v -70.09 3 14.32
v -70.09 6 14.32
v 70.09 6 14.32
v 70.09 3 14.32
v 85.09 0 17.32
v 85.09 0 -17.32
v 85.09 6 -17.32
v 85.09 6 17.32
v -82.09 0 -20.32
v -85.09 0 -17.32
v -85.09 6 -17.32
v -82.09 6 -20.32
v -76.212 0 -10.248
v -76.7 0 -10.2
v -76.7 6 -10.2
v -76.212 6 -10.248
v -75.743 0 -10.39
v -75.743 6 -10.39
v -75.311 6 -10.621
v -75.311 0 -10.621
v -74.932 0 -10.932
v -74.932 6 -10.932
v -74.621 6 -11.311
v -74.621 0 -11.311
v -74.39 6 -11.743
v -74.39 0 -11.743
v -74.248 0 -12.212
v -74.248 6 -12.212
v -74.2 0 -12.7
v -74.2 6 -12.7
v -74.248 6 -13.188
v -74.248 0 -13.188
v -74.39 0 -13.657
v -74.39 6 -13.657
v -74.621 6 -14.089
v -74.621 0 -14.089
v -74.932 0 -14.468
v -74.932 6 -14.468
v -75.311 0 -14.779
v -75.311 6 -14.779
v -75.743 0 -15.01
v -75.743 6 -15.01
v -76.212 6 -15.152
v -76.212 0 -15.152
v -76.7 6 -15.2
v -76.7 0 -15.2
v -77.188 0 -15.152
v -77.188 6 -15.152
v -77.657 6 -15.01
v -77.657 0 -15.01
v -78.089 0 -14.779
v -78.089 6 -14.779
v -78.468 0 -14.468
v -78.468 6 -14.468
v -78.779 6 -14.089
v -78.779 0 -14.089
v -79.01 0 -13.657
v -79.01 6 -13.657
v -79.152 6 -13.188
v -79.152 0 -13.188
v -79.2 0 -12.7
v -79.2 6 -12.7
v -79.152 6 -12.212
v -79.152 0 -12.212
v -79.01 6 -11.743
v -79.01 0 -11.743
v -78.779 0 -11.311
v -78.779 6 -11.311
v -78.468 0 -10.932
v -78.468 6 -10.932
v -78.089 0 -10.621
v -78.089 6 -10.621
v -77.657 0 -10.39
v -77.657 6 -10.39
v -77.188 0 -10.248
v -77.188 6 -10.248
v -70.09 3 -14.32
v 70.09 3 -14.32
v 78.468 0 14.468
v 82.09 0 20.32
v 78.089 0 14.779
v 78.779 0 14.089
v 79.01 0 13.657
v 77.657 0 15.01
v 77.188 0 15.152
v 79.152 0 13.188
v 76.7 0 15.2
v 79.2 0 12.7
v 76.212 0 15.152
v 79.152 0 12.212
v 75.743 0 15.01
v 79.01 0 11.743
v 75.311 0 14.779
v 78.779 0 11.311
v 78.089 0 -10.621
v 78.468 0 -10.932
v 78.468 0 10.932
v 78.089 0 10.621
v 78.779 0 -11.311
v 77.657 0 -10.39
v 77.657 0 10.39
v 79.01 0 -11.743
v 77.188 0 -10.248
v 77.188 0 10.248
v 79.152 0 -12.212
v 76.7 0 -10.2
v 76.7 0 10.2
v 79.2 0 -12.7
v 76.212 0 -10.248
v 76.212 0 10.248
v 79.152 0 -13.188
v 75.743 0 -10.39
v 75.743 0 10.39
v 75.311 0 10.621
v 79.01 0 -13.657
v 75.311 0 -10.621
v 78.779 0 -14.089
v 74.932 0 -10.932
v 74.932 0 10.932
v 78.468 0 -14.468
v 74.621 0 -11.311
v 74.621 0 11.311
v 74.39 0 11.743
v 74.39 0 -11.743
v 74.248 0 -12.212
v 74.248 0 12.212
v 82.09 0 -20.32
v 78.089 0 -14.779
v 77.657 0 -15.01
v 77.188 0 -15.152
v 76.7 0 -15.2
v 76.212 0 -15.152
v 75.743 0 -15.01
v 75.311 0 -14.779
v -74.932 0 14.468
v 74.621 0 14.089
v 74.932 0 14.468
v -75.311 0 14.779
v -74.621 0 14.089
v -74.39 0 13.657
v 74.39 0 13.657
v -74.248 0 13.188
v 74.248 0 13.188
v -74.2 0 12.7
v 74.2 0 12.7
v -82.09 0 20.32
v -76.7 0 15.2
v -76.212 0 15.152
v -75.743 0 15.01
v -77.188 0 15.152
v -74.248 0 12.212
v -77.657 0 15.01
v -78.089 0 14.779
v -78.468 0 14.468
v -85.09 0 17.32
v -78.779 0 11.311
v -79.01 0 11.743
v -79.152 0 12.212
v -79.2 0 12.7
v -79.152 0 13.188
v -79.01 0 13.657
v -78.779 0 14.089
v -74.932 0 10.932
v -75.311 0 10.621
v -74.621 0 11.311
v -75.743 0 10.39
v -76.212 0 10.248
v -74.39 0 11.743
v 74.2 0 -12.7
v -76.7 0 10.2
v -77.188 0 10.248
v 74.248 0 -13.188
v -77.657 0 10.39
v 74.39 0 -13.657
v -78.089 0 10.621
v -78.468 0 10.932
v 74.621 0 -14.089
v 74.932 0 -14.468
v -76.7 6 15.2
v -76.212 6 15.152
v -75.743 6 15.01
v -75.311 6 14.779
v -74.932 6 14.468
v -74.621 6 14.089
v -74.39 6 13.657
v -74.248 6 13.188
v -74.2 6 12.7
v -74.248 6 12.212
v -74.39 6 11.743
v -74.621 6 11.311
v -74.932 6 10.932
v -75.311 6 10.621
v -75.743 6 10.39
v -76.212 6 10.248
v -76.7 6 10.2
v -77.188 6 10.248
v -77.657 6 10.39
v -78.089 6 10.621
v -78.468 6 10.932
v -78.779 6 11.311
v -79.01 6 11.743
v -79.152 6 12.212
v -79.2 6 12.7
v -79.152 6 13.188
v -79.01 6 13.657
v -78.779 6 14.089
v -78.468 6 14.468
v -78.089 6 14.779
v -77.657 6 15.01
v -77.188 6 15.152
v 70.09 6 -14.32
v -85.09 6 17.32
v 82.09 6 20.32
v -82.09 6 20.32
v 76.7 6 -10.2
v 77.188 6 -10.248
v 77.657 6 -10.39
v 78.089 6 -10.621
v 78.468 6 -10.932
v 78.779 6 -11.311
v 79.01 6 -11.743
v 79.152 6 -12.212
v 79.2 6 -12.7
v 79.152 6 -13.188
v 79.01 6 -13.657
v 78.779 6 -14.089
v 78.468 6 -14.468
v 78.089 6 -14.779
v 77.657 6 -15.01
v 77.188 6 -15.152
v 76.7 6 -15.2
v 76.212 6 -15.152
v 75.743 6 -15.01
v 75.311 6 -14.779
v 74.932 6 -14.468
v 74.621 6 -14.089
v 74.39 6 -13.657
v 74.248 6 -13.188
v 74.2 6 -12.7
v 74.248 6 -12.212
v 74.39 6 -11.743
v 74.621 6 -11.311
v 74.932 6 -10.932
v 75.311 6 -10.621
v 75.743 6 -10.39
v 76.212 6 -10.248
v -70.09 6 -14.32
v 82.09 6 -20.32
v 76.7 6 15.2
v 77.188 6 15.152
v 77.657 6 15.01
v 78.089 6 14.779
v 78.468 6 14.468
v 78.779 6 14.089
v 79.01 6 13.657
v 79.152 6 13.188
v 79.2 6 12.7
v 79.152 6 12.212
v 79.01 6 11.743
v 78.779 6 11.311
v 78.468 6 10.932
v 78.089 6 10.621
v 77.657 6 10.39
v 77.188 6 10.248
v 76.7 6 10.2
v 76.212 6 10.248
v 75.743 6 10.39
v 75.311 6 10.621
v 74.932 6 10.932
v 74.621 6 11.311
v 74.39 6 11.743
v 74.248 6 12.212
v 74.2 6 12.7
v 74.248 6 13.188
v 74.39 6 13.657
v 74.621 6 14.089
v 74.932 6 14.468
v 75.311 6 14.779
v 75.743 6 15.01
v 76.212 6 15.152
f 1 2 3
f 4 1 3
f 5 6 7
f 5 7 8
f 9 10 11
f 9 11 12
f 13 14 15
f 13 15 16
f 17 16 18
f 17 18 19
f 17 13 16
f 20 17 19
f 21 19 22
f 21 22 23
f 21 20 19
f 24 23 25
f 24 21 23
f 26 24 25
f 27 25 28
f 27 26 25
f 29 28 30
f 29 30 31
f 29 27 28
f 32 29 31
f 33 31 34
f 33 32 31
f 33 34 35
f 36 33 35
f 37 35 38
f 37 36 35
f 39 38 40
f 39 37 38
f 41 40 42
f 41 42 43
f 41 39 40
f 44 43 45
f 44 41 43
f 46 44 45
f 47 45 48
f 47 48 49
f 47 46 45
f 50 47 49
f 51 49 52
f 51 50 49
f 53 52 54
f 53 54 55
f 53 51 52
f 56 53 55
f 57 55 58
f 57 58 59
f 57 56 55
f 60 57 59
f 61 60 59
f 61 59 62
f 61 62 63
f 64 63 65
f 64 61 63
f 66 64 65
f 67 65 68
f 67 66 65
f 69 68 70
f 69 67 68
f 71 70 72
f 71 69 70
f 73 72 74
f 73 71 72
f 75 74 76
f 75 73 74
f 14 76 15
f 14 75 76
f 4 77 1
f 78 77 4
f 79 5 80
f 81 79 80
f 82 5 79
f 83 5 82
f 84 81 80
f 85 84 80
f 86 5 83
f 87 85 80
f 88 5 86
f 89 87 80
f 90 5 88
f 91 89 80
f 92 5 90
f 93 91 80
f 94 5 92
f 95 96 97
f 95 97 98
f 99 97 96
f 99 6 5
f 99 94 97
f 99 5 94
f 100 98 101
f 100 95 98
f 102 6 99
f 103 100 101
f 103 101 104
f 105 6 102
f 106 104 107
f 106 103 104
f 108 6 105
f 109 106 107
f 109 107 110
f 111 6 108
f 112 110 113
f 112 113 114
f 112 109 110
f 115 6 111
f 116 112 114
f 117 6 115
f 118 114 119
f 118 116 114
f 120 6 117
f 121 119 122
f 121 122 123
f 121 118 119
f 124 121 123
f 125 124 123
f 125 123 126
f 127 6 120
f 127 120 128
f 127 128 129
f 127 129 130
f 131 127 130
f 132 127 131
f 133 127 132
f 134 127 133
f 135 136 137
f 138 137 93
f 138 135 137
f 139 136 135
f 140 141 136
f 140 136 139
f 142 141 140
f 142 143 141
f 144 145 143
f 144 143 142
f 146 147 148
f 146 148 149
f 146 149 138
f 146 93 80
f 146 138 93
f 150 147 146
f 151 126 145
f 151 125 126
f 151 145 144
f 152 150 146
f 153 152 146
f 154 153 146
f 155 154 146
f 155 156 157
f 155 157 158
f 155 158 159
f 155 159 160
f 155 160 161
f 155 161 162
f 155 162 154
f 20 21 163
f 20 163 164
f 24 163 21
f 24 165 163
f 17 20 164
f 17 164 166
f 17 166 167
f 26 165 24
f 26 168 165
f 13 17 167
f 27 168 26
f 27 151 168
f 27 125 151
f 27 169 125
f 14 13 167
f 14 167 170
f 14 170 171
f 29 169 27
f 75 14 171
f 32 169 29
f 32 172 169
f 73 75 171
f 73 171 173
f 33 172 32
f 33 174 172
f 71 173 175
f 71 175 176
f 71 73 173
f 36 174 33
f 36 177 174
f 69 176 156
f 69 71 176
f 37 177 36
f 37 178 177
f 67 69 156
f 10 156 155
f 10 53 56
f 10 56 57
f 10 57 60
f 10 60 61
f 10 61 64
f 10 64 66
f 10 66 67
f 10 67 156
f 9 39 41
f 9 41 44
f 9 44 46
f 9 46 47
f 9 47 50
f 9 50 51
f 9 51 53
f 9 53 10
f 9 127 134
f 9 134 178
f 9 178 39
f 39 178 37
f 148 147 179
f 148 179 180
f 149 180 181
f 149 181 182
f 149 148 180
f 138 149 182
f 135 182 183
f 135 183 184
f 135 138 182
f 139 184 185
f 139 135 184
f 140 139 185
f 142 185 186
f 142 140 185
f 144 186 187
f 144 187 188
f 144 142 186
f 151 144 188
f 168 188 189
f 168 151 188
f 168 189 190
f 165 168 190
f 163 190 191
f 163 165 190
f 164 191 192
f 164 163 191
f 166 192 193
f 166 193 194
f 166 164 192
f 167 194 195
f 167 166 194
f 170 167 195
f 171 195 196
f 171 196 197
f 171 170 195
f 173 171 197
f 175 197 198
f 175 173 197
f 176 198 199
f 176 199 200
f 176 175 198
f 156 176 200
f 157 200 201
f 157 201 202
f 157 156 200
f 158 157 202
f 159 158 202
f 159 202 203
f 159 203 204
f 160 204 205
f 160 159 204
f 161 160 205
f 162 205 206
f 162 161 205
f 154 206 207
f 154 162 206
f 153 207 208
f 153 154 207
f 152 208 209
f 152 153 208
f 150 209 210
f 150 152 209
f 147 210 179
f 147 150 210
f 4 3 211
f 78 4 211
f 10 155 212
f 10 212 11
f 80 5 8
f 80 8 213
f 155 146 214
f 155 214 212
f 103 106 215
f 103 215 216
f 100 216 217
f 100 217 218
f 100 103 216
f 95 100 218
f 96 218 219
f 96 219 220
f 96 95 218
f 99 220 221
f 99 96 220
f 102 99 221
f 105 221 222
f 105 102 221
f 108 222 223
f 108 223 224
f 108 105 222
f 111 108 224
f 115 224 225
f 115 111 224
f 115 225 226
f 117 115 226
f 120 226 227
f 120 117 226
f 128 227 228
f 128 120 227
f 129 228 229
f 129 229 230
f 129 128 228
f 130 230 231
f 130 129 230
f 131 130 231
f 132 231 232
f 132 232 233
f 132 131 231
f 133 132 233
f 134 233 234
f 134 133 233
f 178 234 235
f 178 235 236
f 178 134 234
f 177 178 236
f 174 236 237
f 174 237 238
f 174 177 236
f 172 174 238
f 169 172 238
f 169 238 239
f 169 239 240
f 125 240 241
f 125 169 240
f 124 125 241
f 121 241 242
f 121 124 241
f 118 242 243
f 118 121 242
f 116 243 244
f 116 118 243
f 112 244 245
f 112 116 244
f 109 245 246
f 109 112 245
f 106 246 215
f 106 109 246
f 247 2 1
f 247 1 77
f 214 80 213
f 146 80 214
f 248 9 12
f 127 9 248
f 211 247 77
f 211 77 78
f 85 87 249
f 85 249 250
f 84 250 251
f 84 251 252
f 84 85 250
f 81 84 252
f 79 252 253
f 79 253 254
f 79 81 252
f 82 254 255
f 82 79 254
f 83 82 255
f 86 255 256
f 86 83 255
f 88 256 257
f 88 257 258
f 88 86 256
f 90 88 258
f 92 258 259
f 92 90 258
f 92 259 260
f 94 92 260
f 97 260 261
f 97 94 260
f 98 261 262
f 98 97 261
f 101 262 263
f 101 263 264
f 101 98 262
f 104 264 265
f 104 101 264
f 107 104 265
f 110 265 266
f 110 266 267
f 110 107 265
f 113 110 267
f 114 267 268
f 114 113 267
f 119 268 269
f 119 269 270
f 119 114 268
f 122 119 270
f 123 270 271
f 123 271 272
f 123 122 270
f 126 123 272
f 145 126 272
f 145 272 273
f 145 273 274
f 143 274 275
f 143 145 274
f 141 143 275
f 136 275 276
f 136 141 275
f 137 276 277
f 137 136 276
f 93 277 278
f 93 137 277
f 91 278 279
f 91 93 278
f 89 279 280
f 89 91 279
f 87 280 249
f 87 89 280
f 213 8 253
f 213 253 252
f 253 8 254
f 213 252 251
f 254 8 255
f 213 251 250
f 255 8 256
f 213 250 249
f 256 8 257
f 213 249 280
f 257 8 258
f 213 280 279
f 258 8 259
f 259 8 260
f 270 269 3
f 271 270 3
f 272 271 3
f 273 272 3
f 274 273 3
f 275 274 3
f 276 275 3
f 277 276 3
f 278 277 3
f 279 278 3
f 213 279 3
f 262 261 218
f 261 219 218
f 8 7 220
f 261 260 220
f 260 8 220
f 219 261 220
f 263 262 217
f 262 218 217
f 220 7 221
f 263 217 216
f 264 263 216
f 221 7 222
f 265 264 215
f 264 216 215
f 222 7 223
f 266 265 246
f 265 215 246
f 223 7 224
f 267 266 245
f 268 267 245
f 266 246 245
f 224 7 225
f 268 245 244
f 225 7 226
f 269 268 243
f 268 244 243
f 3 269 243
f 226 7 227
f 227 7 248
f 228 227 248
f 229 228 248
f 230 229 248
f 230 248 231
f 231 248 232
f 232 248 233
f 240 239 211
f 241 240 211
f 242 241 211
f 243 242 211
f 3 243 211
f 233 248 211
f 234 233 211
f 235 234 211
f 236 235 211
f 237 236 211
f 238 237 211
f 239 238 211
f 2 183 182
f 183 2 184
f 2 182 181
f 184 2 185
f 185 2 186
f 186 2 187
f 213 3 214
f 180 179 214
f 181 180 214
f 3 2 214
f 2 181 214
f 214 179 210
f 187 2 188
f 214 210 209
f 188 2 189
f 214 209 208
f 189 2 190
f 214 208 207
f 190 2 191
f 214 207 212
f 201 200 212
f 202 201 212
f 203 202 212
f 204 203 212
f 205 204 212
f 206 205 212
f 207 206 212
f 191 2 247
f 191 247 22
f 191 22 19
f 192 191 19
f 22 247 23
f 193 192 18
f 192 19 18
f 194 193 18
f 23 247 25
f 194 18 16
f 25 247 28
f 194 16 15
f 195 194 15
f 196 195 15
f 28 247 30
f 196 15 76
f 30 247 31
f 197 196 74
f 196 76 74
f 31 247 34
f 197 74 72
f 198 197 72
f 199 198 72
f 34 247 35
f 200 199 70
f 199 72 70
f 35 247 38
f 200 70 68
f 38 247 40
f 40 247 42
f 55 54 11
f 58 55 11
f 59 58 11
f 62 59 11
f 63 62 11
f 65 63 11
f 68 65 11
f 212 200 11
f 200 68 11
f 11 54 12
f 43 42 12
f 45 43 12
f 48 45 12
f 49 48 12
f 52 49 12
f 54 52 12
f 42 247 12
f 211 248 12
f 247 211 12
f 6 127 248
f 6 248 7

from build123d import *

# Parameters (mm, degrees)
SKETCH1_R           = 2.5
BOSS_EXTRUDE2_DEPTH = 6
SKETCH2_W           = 140.18
SKETCH2_H           = 28.64
CUT_EXTRUDE1_DEPTH  = 3


with BuildPart() as part:
    # Sketch1 → Boss-Extrude2 (new body)
    with BuildSketch(Plane(origin=(0, 0, 0), x_dir=(1, 0, 0), z_dir=(0, 1, 0))):
        Polygon((-85.09, 17.32), (-82.09, 20.32), (82.09, 20.32), (85.09, 17.32), (85.09, -17.32), (82.09, -20.32), (-82.09, -20.32), (-85.09, -17.32), align=None)
        with Locations(Location((-76.7, 12.7, 0), (0, 0, 270))):
            Circle(SKETCH1_R, mode=Mode.SUBTRACT)
        with Locations(Location((-76.7, -12.7, 0), (0, 0, 270))):
            Circle(SKETCH1_R, mode=Mode.SUBTRACT)
        with Locations(Location((76.7, 12.7, 0), (0, 0, 270))):
            Circle(SKETCH1_R, mode=Mode.SUBTRACT)
        with Locations(Location((76.7, -12.7, 0), (0, 0, 270))):
            Circle(SKETCH1_R, mode=Mode.SUBTRACT)
    extrude(amount=BOSS_EXTRUDE2_DEPTH)

    # Sketch2 → Cut-Extrude1 (cut)
    with BuildSketch(Plane(origin=(0, 6, 0), x_dir=(1, 0, 0), z_dir=(0, 1, 0))):
        Rectangle(SKETCH2_W, SKETCH2_H)
    extrude(amount=-CUT_EXTRUDE1_DEPTH, mode=Mode.SUBTRACT)


solid = part.part
